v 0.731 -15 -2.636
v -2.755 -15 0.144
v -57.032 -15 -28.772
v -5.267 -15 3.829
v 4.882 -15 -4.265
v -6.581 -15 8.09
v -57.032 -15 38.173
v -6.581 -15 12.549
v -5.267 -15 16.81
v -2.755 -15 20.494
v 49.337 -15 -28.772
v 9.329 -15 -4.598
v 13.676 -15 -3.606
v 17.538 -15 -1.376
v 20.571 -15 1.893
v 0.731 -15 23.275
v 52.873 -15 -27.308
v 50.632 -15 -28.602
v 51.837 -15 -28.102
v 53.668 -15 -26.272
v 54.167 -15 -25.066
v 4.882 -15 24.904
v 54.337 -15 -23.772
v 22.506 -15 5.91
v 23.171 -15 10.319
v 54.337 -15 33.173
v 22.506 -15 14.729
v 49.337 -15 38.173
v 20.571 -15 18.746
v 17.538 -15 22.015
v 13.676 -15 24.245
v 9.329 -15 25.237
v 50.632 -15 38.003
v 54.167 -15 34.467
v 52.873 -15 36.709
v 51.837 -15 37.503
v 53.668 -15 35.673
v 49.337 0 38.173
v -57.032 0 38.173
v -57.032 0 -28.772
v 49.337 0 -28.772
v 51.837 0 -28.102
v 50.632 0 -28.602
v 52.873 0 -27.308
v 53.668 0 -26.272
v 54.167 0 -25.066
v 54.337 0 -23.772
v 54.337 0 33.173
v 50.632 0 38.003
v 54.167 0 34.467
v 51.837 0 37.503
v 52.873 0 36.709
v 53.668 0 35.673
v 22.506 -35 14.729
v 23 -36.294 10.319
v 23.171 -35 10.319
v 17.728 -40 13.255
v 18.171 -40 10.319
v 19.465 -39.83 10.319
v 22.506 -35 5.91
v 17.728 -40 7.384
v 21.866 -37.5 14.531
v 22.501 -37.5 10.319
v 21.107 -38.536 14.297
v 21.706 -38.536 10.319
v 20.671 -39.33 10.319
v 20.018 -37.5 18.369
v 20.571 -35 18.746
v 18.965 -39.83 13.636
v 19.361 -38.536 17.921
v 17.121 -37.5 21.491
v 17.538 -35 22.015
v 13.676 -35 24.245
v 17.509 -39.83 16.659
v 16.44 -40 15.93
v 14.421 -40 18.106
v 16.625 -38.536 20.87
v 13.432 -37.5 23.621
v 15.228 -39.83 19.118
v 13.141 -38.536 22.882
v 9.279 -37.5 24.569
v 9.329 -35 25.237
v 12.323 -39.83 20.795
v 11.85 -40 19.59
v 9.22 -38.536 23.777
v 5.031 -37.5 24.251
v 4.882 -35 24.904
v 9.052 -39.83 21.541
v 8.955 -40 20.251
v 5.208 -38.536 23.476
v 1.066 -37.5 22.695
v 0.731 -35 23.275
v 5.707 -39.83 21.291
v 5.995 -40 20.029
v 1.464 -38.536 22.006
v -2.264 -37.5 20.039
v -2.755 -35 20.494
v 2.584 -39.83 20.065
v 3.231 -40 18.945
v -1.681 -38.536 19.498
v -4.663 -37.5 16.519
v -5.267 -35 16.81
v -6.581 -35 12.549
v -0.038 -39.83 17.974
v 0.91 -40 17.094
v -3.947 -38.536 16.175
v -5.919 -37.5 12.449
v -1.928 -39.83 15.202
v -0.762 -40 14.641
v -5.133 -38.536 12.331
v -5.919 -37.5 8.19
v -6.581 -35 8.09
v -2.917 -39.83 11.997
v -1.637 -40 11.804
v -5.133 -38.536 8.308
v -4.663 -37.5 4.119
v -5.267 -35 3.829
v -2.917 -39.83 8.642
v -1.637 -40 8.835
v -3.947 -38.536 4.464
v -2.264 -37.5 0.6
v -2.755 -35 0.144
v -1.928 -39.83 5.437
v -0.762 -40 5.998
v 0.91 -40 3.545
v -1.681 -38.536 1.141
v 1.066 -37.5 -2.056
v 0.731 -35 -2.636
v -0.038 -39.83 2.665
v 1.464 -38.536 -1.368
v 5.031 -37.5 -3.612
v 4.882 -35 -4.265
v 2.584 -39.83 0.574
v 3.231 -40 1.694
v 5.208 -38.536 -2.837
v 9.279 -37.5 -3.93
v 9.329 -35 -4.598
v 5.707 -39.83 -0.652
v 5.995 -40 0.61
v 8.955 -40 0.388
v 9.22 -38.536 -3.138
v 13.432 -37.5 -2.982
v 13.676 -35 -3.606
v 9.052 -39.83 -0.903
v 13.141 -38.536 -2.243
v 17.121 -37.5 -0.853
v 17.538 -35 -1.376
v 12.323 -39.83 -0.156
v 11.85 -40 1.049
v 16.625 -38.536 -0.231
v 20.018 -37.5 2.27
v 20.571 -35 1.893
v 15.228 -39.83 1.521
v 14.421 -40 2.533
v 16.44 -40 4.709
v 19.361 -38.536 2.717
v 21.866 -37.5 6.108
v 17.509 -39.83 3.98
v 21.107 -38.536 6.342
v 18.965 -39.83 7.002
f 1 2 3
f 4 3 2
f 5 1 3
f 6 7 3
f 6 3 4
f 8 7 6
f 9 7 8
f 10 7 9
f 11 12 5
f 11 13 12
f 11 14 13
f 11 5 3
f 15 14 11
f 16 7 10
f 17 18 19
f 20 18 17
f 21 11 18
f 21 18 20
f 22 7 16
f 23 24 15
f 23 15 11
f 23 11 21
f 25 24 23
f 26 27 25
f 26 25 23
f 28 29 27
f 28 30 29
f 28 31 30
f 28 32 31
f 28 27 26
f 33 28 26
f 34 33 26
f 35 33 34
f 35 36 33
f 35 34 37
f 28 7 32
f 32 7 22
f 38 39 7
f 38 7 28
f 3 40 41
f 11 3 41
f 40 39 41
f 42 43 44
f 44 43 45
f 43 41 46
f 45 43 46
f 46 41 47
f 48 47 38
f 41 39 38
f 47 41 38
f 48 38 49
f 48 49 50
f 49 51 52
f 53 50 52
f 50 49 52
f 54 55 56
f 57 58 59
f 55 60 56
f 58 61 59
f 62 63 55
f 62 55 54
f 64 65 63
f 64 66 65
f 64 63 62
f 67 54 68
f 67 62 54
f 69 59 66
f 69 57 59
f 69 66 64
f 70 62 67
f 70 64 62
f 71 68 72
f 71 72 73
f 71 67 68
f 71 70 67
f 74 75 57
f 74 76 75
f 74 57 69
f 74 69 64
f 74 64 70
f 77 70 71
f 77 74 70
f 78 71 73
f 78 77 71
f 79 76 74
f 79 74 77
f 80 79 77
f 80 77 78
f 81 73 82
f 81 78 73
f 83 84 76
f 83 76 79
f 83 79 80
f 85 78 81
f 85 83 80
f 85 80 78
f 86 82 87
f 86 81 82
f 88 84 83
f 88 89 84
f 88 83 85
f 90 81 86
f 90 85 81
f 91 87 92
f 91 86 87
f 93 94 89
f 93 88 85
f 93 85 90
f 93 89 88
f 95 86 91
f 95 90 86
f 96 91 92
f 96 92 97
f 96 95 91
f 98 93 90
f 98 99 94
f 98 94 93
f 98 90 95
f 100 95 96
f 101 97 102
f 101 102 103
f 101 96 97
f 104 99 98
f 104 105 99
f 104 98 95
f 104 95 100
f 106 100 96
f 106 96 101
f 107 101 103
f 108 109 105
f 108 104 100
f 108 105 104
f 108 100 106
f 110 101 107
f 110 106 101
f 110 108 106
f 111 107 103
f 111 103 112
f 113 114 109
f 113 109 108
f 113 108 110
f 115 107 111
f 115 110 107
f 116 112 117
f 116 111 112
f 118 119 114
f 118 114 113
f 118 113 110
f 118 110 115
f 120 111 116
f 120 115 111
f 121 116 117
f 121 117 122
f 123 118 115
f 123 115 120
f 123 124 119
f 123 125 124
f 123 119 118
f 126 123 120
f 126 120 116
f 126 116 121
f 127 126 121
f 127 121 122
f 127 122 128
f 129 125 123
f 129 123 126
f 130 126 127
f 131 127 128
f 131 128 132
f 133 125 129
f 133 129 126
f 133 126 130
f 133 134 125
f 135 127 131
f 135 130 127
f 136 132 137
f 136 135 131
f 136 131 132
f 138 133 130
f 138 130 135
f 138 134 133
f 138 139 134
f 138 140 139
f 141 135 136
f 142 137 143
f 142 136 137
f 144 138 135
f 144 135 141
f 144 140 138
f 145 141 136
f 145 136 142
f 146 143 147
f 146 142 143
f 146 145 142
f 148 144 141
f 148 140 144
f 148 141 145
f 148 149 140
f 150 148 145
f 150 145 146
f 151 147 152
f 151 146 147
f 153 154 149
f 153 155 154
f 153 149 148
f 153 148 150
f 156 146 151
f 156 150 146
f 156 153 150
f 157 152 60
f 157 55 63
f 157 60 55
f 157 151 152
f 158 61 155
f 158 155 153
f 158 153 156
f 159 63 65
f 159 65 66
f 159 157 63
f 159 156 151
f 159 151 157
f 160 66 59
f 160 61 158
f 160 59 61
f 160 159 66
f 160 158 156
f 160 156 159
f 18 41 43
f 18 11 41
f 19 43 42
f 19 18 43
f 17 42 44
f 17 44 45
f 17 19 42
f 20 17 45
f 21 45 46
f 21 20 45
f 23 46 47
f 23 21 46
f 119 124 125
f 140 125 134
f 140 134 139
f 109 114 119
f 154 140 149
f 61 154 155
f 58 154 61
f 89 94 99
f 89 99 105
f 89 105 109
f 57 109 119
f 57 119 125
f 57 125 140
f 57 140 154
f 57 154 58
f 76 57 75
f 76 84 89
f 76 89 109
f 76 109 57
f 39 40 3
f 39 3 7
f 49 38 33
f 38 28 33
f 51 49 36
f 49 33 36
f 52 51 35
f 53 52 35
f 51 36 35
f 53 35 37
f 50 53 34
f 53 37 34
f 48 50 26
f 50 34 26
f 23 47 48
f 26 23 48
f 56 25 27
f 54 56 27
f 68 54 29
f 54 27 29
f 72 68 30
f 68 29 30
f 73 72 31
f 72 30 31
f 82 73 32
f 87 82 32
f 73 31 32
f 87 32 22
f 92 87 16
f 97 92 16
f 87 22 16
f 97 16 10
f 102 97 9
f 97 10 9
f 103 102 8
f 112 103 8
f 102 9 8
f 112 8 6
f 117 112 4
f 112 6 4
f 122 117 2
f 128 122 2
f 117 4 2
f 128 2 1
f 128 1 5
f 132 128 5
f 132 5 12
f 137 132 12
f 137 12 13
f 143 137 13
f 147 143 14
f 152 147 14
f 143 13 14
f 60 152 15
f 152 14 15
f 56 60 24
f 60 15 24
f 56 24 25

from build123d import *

# Parameters (mm, degrees)
F0_W     = 111.369263
F0_H     = 66.945155
F1_DEPTH = 15
F2_R     = 14.959389
F3_DEPTH = 25
F4_R     = 5


with BuildPart() as f1:
    # F0 (on Front) → F1 (new body)
    with BuildSketch(Plane.XZ):
        with Locations((-1.347209, 4.700554)):
            Rectangle(F0_W, F0_H)
    extrude(amount=F1_DEPTH)

    # F2 (on face) → F3 (join)
    with BuildSketch(Plane.XZ.offset(15)):
        with Locations((8.211179, 10.319434)):
            Circle(F2_R)
    extrude(amount=F3_DEPTH)

    # F4
    f4_edges = [f1.edges().sort_by_distance(p)[0] for p in [
        (54.337423, -7.5, 38.173132),
        (54.337423, -7.5, -28.772023),
        (-6.74821, -40, 10.319434),
    ]]
    fillet(f4_edges, radius=F4_R)


solid = f1.part
